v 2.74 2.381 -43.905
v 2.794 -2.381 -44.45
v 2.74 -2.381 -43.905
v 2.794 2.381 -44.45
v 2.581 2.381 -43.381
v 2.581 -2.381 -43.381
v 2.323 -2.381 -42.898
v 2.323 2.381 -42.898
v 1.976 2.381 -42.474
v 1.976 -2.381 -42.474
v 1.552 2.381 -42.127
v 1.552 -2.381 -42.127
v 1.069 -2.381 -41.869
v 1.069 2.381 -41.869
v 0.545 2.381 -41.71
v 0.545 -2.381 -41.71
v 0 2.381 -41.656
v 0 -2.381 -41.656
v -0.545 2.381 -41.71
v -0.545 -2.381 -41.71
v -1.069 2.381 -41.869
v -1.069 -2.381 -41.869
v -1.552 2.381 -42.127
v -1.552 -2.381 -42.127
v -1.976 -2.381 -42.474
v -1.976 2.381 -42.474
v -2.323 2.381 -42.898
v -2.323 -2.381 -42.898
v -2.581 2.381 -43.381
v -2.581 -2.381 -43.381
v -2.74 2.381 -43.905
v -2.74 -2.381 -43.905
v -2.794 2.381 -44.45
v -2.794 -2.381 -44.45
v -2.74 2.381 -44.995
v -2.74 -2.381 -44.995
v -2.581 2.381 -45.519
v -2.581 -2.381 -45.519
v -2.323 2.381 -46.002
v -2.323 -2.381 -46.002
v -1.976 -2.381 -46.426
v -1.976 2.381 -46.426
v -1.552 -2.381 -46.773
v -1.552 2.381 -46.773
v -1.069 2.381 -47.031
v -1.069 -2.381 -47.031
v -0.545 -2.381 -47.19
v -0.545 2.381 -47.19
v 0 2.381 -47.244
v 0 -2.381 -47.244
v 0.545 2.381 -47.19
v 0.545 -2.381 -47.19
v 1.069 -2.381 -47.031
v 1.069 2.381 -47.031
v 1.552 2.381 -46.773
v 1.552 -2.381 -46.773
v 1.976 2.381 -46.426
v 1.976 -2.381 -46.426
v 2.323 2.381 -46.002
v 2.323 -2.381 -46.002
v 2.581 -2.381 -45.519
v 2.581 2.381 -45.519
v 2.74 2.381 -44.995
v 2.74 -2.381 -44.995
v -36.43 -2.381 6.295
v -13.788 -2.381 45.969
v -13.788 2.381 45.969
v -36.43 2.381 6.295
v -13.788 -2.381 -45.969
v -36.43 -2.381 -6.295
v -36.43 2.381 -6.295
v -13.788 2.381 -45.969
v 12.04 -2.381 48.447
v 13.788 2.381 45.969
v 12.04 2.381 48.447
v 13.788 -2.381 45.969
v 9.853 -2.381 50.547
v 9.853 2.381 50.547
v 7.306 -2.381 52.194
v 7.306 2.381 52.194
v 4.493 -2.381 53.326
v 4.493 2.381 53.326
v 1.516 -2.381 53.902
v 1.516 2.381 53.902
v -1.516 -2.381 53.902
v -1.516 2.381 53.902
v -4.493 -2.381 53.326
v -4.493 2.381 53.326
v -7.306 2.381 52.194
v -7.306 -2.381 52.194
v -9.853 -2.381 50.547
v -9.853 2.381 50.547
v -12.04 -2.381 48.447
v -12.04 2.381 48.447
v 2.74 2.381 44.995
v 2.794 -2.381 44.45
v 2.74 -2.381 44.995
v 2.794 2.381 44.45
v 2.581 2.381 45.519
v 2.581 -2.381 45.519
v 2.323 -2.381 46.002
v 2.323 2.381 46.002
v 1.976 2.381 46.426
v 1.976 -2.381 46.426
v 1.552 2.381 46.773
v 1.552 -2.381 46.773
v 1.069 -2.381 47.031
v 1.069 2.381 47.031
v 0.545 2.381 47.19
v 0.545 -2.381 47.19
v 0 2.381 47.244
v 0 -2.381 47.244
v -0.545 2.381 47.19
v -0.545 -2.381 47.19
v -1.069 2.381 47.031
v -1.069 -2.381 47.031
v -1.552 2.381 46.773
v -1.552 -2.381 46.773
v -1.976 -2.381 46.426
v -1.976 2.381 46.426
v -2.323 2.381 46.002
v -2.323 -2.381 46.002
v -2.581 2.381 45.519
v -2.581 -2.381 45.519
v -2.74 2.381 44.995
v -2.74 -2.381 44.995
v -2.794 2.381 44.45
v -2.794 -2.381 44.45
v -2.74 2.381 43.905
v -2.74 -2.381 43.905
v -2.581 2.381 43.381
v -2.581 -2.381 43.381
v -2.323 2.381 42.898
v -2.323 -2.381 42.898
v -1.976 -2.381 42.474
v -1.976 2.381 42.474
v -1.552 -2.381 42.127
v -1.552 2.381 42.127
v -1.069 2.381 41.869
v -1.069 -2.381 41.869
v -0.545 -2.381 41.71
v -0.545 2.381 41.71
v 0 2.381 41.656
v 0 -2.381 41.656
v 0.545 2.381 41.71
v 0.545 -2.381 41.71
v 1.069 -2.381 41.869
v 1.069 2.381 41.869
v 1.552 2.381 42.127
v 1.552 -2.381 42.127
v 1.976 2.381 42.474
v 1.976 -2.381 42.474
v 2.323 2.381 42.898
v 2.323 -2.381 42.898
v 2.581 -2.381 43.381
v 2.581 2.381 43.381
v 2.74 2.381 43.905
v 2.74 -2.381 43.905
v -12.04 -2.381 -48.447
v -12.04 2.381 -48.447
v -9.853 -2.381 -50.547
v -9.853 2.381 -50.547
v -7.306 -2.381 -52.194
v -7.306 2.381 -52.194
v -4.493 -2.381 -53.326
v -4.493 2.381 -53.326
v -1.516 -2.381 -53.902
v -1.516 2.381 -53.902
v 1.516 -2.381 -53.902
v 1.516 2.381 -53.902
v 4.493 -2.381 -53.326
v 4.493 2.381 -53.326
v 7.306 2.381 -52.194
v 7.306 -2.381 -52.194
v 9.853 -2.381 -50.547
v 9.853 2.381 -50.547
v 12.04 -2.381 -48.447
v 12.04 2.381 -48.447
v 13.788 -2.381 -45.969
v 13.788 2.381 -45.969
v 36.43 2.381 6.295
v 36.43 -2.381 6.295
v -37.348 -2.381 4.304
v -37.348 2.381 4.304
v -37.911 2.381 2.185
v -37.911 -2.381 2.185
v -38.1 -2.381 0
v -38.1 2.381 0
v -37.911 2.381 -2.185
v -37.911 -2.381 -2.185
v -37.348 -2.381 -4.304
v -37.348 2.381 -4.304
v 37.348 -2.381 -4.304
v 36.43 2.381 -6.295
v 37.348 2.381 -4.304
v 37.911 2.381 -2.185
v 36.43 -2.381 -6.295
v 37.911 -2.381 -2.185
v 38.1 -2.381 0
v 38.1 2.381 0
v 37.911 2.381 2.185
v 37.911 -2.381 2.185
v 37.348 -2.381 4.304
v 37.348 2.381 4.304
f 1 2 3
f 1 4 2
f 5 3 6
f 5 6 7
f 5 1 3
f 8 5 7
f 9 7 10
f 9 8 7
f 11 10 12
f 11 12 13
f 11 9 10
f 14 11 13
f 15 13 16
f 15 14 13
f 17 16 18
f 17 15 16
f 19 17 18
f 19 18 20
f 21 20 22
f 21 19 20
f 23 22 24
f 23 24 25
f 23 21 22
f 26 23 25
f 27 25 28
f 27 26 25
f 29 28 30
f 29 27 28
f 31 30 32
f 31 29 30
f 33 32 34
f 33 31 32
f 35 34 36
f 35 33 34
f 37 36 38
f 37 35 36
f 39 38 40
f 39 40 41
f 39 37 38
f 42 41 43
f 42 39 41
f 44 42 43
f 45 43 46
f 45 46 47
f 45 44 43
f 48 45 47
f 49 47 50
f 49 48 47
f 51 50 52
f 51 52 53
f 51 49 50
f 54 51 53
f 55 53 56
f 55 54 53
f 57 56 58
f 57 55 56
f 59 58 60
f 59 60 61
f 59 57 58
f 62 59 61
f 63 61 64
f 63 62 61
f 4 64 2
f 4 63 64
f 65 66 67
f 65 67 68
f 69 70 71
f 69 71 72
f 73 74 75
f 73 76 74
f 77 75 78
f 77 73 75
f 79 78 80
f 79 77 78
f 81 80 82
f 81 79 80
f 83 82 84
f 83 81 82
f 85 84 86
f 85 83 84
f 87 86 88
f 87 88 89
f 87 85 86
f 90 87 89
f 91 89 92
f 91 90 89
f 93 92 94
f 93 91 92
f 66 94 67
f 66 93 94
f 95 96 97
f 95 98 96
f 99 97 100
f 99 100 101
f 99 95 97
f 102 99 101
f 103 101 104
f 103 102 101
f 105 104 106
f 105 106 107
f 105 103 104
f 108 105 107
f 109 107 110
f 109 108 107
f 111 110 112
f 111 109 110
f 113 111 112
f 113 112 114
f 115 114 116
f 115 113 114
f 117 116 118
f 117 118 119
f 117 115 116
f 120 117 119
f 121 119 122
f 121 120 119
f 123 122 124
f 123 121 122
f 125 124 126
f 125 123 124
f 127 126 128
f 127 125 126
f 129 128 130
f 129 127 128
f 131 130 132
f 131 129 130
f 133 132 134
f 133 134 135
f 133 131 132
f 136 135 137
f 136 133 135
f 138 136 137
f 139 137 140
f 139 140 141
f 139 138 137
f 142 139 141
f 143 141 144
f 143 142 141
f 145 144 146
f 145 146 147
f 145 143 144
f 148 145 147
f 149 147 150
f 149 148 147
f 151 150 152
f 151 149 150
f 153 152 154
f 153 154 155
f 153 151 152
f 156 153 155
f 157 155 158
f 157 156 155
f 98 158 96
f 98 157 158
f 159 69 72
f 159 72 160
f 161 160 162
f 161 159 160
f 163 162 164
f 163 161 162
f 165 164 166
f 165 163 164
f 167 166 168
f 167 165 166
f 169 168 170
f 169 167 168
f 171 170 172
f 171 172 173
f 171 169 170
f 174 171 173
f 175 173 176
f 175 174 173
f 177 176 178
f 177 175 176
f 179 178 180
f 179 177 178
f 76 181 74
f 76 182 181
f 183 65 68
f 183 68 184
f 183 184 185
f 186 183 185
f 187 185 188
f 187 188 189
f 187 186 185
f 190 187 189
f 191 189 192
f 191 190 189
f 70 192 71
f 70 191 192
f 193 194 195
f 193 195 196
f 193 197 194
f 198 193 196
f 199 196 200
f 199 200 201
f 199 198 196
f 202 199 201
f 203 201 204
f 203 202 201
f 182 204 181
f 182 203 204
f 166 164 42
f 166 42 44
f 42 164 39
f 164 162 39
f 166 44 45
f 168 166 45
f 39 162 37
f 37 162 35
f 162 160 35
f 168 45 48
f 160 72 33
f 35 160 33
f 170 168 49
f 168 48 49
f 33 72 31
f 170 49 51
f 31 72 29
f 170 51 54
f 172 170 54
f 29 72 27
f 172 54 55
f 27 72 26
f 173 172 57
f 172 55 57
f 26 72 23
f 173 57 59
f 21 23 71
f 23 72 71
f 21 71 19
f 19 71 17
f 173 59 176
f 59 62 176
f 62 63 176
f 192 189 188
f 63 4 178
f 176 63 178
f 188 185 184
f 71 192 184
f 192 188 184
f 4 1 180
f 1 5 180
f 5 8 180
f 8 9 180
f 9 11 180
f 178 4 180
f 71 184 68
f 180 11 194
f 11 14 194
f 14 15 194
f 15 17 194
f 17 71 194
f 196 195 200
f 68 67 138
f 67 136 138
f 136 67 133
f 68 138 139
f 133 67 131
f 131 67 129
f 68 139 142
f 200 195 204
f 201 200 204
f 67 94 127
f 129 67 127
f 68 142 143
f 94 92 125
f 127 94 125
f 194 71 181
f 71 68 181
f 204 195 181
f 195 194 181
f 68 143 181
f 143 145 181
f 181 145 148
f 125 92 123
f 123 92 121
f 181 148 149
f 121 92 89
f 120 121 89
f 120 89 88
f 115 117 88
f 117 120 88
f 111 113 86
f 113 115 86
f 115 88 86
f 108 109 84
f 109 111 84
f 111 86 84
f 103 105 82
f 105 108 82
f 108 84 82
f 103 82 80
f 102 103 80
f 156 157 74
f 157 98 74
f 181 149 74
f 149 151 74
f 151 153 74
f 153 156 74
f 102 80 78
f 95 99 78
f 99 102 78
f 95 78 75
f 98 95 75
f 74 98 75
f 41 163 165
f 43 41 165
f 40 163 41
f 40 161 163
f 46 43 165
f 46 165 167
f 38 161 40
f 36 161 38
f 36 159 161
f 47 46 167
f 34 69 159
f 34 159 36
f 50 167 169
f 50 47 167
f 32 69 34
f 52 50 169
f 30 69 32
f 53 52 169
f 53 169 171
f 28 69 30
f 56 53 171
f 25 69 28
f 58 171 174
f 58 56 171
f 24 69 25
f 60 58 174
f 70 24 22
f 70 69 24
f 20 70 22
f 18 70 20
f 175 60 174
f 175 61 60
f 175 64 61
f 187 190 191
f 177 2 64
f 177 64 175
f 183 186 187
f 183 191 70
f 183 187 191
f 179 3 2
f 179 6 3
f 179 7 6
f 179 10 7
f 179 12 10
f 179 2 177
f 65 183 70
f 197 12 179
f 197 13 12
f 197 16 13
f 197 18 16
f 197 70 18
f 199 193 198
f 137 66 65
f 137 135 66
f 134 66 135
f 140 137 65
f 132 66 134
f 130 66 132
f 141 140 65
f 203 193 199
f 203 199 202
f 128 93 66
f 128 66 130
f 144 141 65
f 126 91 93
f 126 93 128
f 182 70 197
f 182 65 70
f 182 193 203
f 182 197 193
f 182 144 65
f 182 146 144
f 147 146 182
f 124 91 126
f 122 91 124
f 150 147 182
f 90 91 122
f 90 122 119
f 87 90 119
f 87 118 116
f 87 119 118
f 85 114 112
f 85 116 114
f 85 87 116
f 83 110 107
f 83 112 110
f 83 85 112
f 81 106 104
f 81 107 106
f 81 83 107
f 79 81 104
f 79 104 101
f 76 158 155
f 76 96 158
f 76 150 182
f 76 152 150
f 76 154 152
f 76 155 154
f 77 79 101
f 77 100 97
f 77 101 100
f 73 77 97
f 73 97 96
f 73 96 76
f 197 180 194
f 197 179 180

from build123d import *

# Parameters (mm, degrees)
F0_R     = 2.794
F1_DEPTH = 2.38125


with BuildPart() as f1:
    # F0 (on Front) → F1 (new body, symmetric)
    with BuildSketch(Plane.XZ):
        with BuildLine():
            ThreePointArc((13.787585, 45.968807), (0, 53.975), (-13.787585, 45.968807))
            Line((-13.787585, 45.968807), (-36.430068, 6.295045))
            ThreePointArc((-36.430068, 6.295045), (-38.1, 0), (-36.430068, -6.295045))
            Line((-36.430068, -6.295045), (-13.787585, -45.968807))
            ThreePointArc((-13.787585, -45.968807), (0, -53.975), (13.787585, -45.968807))
            Line((13.787585, -45.968807), (36.430068, -6.295045))
            ThreePointArc((36.430068, -6.295045), (38.1, 0), (36.430068, 6.295045))
            Line((36.430068, 6.295045), (13.787585, 45.968807))
        make_face()
        with Locations((0, -44.45)):
            Circle(F0_R, mode=Mode.SUBTRACT)
        with Locations((0, 44.45)):
            Circle(F0_R, mode=Mode.SUBTRACT)
    extrude(amount=F1_DEPTH, both=True)


solid = f1.part
